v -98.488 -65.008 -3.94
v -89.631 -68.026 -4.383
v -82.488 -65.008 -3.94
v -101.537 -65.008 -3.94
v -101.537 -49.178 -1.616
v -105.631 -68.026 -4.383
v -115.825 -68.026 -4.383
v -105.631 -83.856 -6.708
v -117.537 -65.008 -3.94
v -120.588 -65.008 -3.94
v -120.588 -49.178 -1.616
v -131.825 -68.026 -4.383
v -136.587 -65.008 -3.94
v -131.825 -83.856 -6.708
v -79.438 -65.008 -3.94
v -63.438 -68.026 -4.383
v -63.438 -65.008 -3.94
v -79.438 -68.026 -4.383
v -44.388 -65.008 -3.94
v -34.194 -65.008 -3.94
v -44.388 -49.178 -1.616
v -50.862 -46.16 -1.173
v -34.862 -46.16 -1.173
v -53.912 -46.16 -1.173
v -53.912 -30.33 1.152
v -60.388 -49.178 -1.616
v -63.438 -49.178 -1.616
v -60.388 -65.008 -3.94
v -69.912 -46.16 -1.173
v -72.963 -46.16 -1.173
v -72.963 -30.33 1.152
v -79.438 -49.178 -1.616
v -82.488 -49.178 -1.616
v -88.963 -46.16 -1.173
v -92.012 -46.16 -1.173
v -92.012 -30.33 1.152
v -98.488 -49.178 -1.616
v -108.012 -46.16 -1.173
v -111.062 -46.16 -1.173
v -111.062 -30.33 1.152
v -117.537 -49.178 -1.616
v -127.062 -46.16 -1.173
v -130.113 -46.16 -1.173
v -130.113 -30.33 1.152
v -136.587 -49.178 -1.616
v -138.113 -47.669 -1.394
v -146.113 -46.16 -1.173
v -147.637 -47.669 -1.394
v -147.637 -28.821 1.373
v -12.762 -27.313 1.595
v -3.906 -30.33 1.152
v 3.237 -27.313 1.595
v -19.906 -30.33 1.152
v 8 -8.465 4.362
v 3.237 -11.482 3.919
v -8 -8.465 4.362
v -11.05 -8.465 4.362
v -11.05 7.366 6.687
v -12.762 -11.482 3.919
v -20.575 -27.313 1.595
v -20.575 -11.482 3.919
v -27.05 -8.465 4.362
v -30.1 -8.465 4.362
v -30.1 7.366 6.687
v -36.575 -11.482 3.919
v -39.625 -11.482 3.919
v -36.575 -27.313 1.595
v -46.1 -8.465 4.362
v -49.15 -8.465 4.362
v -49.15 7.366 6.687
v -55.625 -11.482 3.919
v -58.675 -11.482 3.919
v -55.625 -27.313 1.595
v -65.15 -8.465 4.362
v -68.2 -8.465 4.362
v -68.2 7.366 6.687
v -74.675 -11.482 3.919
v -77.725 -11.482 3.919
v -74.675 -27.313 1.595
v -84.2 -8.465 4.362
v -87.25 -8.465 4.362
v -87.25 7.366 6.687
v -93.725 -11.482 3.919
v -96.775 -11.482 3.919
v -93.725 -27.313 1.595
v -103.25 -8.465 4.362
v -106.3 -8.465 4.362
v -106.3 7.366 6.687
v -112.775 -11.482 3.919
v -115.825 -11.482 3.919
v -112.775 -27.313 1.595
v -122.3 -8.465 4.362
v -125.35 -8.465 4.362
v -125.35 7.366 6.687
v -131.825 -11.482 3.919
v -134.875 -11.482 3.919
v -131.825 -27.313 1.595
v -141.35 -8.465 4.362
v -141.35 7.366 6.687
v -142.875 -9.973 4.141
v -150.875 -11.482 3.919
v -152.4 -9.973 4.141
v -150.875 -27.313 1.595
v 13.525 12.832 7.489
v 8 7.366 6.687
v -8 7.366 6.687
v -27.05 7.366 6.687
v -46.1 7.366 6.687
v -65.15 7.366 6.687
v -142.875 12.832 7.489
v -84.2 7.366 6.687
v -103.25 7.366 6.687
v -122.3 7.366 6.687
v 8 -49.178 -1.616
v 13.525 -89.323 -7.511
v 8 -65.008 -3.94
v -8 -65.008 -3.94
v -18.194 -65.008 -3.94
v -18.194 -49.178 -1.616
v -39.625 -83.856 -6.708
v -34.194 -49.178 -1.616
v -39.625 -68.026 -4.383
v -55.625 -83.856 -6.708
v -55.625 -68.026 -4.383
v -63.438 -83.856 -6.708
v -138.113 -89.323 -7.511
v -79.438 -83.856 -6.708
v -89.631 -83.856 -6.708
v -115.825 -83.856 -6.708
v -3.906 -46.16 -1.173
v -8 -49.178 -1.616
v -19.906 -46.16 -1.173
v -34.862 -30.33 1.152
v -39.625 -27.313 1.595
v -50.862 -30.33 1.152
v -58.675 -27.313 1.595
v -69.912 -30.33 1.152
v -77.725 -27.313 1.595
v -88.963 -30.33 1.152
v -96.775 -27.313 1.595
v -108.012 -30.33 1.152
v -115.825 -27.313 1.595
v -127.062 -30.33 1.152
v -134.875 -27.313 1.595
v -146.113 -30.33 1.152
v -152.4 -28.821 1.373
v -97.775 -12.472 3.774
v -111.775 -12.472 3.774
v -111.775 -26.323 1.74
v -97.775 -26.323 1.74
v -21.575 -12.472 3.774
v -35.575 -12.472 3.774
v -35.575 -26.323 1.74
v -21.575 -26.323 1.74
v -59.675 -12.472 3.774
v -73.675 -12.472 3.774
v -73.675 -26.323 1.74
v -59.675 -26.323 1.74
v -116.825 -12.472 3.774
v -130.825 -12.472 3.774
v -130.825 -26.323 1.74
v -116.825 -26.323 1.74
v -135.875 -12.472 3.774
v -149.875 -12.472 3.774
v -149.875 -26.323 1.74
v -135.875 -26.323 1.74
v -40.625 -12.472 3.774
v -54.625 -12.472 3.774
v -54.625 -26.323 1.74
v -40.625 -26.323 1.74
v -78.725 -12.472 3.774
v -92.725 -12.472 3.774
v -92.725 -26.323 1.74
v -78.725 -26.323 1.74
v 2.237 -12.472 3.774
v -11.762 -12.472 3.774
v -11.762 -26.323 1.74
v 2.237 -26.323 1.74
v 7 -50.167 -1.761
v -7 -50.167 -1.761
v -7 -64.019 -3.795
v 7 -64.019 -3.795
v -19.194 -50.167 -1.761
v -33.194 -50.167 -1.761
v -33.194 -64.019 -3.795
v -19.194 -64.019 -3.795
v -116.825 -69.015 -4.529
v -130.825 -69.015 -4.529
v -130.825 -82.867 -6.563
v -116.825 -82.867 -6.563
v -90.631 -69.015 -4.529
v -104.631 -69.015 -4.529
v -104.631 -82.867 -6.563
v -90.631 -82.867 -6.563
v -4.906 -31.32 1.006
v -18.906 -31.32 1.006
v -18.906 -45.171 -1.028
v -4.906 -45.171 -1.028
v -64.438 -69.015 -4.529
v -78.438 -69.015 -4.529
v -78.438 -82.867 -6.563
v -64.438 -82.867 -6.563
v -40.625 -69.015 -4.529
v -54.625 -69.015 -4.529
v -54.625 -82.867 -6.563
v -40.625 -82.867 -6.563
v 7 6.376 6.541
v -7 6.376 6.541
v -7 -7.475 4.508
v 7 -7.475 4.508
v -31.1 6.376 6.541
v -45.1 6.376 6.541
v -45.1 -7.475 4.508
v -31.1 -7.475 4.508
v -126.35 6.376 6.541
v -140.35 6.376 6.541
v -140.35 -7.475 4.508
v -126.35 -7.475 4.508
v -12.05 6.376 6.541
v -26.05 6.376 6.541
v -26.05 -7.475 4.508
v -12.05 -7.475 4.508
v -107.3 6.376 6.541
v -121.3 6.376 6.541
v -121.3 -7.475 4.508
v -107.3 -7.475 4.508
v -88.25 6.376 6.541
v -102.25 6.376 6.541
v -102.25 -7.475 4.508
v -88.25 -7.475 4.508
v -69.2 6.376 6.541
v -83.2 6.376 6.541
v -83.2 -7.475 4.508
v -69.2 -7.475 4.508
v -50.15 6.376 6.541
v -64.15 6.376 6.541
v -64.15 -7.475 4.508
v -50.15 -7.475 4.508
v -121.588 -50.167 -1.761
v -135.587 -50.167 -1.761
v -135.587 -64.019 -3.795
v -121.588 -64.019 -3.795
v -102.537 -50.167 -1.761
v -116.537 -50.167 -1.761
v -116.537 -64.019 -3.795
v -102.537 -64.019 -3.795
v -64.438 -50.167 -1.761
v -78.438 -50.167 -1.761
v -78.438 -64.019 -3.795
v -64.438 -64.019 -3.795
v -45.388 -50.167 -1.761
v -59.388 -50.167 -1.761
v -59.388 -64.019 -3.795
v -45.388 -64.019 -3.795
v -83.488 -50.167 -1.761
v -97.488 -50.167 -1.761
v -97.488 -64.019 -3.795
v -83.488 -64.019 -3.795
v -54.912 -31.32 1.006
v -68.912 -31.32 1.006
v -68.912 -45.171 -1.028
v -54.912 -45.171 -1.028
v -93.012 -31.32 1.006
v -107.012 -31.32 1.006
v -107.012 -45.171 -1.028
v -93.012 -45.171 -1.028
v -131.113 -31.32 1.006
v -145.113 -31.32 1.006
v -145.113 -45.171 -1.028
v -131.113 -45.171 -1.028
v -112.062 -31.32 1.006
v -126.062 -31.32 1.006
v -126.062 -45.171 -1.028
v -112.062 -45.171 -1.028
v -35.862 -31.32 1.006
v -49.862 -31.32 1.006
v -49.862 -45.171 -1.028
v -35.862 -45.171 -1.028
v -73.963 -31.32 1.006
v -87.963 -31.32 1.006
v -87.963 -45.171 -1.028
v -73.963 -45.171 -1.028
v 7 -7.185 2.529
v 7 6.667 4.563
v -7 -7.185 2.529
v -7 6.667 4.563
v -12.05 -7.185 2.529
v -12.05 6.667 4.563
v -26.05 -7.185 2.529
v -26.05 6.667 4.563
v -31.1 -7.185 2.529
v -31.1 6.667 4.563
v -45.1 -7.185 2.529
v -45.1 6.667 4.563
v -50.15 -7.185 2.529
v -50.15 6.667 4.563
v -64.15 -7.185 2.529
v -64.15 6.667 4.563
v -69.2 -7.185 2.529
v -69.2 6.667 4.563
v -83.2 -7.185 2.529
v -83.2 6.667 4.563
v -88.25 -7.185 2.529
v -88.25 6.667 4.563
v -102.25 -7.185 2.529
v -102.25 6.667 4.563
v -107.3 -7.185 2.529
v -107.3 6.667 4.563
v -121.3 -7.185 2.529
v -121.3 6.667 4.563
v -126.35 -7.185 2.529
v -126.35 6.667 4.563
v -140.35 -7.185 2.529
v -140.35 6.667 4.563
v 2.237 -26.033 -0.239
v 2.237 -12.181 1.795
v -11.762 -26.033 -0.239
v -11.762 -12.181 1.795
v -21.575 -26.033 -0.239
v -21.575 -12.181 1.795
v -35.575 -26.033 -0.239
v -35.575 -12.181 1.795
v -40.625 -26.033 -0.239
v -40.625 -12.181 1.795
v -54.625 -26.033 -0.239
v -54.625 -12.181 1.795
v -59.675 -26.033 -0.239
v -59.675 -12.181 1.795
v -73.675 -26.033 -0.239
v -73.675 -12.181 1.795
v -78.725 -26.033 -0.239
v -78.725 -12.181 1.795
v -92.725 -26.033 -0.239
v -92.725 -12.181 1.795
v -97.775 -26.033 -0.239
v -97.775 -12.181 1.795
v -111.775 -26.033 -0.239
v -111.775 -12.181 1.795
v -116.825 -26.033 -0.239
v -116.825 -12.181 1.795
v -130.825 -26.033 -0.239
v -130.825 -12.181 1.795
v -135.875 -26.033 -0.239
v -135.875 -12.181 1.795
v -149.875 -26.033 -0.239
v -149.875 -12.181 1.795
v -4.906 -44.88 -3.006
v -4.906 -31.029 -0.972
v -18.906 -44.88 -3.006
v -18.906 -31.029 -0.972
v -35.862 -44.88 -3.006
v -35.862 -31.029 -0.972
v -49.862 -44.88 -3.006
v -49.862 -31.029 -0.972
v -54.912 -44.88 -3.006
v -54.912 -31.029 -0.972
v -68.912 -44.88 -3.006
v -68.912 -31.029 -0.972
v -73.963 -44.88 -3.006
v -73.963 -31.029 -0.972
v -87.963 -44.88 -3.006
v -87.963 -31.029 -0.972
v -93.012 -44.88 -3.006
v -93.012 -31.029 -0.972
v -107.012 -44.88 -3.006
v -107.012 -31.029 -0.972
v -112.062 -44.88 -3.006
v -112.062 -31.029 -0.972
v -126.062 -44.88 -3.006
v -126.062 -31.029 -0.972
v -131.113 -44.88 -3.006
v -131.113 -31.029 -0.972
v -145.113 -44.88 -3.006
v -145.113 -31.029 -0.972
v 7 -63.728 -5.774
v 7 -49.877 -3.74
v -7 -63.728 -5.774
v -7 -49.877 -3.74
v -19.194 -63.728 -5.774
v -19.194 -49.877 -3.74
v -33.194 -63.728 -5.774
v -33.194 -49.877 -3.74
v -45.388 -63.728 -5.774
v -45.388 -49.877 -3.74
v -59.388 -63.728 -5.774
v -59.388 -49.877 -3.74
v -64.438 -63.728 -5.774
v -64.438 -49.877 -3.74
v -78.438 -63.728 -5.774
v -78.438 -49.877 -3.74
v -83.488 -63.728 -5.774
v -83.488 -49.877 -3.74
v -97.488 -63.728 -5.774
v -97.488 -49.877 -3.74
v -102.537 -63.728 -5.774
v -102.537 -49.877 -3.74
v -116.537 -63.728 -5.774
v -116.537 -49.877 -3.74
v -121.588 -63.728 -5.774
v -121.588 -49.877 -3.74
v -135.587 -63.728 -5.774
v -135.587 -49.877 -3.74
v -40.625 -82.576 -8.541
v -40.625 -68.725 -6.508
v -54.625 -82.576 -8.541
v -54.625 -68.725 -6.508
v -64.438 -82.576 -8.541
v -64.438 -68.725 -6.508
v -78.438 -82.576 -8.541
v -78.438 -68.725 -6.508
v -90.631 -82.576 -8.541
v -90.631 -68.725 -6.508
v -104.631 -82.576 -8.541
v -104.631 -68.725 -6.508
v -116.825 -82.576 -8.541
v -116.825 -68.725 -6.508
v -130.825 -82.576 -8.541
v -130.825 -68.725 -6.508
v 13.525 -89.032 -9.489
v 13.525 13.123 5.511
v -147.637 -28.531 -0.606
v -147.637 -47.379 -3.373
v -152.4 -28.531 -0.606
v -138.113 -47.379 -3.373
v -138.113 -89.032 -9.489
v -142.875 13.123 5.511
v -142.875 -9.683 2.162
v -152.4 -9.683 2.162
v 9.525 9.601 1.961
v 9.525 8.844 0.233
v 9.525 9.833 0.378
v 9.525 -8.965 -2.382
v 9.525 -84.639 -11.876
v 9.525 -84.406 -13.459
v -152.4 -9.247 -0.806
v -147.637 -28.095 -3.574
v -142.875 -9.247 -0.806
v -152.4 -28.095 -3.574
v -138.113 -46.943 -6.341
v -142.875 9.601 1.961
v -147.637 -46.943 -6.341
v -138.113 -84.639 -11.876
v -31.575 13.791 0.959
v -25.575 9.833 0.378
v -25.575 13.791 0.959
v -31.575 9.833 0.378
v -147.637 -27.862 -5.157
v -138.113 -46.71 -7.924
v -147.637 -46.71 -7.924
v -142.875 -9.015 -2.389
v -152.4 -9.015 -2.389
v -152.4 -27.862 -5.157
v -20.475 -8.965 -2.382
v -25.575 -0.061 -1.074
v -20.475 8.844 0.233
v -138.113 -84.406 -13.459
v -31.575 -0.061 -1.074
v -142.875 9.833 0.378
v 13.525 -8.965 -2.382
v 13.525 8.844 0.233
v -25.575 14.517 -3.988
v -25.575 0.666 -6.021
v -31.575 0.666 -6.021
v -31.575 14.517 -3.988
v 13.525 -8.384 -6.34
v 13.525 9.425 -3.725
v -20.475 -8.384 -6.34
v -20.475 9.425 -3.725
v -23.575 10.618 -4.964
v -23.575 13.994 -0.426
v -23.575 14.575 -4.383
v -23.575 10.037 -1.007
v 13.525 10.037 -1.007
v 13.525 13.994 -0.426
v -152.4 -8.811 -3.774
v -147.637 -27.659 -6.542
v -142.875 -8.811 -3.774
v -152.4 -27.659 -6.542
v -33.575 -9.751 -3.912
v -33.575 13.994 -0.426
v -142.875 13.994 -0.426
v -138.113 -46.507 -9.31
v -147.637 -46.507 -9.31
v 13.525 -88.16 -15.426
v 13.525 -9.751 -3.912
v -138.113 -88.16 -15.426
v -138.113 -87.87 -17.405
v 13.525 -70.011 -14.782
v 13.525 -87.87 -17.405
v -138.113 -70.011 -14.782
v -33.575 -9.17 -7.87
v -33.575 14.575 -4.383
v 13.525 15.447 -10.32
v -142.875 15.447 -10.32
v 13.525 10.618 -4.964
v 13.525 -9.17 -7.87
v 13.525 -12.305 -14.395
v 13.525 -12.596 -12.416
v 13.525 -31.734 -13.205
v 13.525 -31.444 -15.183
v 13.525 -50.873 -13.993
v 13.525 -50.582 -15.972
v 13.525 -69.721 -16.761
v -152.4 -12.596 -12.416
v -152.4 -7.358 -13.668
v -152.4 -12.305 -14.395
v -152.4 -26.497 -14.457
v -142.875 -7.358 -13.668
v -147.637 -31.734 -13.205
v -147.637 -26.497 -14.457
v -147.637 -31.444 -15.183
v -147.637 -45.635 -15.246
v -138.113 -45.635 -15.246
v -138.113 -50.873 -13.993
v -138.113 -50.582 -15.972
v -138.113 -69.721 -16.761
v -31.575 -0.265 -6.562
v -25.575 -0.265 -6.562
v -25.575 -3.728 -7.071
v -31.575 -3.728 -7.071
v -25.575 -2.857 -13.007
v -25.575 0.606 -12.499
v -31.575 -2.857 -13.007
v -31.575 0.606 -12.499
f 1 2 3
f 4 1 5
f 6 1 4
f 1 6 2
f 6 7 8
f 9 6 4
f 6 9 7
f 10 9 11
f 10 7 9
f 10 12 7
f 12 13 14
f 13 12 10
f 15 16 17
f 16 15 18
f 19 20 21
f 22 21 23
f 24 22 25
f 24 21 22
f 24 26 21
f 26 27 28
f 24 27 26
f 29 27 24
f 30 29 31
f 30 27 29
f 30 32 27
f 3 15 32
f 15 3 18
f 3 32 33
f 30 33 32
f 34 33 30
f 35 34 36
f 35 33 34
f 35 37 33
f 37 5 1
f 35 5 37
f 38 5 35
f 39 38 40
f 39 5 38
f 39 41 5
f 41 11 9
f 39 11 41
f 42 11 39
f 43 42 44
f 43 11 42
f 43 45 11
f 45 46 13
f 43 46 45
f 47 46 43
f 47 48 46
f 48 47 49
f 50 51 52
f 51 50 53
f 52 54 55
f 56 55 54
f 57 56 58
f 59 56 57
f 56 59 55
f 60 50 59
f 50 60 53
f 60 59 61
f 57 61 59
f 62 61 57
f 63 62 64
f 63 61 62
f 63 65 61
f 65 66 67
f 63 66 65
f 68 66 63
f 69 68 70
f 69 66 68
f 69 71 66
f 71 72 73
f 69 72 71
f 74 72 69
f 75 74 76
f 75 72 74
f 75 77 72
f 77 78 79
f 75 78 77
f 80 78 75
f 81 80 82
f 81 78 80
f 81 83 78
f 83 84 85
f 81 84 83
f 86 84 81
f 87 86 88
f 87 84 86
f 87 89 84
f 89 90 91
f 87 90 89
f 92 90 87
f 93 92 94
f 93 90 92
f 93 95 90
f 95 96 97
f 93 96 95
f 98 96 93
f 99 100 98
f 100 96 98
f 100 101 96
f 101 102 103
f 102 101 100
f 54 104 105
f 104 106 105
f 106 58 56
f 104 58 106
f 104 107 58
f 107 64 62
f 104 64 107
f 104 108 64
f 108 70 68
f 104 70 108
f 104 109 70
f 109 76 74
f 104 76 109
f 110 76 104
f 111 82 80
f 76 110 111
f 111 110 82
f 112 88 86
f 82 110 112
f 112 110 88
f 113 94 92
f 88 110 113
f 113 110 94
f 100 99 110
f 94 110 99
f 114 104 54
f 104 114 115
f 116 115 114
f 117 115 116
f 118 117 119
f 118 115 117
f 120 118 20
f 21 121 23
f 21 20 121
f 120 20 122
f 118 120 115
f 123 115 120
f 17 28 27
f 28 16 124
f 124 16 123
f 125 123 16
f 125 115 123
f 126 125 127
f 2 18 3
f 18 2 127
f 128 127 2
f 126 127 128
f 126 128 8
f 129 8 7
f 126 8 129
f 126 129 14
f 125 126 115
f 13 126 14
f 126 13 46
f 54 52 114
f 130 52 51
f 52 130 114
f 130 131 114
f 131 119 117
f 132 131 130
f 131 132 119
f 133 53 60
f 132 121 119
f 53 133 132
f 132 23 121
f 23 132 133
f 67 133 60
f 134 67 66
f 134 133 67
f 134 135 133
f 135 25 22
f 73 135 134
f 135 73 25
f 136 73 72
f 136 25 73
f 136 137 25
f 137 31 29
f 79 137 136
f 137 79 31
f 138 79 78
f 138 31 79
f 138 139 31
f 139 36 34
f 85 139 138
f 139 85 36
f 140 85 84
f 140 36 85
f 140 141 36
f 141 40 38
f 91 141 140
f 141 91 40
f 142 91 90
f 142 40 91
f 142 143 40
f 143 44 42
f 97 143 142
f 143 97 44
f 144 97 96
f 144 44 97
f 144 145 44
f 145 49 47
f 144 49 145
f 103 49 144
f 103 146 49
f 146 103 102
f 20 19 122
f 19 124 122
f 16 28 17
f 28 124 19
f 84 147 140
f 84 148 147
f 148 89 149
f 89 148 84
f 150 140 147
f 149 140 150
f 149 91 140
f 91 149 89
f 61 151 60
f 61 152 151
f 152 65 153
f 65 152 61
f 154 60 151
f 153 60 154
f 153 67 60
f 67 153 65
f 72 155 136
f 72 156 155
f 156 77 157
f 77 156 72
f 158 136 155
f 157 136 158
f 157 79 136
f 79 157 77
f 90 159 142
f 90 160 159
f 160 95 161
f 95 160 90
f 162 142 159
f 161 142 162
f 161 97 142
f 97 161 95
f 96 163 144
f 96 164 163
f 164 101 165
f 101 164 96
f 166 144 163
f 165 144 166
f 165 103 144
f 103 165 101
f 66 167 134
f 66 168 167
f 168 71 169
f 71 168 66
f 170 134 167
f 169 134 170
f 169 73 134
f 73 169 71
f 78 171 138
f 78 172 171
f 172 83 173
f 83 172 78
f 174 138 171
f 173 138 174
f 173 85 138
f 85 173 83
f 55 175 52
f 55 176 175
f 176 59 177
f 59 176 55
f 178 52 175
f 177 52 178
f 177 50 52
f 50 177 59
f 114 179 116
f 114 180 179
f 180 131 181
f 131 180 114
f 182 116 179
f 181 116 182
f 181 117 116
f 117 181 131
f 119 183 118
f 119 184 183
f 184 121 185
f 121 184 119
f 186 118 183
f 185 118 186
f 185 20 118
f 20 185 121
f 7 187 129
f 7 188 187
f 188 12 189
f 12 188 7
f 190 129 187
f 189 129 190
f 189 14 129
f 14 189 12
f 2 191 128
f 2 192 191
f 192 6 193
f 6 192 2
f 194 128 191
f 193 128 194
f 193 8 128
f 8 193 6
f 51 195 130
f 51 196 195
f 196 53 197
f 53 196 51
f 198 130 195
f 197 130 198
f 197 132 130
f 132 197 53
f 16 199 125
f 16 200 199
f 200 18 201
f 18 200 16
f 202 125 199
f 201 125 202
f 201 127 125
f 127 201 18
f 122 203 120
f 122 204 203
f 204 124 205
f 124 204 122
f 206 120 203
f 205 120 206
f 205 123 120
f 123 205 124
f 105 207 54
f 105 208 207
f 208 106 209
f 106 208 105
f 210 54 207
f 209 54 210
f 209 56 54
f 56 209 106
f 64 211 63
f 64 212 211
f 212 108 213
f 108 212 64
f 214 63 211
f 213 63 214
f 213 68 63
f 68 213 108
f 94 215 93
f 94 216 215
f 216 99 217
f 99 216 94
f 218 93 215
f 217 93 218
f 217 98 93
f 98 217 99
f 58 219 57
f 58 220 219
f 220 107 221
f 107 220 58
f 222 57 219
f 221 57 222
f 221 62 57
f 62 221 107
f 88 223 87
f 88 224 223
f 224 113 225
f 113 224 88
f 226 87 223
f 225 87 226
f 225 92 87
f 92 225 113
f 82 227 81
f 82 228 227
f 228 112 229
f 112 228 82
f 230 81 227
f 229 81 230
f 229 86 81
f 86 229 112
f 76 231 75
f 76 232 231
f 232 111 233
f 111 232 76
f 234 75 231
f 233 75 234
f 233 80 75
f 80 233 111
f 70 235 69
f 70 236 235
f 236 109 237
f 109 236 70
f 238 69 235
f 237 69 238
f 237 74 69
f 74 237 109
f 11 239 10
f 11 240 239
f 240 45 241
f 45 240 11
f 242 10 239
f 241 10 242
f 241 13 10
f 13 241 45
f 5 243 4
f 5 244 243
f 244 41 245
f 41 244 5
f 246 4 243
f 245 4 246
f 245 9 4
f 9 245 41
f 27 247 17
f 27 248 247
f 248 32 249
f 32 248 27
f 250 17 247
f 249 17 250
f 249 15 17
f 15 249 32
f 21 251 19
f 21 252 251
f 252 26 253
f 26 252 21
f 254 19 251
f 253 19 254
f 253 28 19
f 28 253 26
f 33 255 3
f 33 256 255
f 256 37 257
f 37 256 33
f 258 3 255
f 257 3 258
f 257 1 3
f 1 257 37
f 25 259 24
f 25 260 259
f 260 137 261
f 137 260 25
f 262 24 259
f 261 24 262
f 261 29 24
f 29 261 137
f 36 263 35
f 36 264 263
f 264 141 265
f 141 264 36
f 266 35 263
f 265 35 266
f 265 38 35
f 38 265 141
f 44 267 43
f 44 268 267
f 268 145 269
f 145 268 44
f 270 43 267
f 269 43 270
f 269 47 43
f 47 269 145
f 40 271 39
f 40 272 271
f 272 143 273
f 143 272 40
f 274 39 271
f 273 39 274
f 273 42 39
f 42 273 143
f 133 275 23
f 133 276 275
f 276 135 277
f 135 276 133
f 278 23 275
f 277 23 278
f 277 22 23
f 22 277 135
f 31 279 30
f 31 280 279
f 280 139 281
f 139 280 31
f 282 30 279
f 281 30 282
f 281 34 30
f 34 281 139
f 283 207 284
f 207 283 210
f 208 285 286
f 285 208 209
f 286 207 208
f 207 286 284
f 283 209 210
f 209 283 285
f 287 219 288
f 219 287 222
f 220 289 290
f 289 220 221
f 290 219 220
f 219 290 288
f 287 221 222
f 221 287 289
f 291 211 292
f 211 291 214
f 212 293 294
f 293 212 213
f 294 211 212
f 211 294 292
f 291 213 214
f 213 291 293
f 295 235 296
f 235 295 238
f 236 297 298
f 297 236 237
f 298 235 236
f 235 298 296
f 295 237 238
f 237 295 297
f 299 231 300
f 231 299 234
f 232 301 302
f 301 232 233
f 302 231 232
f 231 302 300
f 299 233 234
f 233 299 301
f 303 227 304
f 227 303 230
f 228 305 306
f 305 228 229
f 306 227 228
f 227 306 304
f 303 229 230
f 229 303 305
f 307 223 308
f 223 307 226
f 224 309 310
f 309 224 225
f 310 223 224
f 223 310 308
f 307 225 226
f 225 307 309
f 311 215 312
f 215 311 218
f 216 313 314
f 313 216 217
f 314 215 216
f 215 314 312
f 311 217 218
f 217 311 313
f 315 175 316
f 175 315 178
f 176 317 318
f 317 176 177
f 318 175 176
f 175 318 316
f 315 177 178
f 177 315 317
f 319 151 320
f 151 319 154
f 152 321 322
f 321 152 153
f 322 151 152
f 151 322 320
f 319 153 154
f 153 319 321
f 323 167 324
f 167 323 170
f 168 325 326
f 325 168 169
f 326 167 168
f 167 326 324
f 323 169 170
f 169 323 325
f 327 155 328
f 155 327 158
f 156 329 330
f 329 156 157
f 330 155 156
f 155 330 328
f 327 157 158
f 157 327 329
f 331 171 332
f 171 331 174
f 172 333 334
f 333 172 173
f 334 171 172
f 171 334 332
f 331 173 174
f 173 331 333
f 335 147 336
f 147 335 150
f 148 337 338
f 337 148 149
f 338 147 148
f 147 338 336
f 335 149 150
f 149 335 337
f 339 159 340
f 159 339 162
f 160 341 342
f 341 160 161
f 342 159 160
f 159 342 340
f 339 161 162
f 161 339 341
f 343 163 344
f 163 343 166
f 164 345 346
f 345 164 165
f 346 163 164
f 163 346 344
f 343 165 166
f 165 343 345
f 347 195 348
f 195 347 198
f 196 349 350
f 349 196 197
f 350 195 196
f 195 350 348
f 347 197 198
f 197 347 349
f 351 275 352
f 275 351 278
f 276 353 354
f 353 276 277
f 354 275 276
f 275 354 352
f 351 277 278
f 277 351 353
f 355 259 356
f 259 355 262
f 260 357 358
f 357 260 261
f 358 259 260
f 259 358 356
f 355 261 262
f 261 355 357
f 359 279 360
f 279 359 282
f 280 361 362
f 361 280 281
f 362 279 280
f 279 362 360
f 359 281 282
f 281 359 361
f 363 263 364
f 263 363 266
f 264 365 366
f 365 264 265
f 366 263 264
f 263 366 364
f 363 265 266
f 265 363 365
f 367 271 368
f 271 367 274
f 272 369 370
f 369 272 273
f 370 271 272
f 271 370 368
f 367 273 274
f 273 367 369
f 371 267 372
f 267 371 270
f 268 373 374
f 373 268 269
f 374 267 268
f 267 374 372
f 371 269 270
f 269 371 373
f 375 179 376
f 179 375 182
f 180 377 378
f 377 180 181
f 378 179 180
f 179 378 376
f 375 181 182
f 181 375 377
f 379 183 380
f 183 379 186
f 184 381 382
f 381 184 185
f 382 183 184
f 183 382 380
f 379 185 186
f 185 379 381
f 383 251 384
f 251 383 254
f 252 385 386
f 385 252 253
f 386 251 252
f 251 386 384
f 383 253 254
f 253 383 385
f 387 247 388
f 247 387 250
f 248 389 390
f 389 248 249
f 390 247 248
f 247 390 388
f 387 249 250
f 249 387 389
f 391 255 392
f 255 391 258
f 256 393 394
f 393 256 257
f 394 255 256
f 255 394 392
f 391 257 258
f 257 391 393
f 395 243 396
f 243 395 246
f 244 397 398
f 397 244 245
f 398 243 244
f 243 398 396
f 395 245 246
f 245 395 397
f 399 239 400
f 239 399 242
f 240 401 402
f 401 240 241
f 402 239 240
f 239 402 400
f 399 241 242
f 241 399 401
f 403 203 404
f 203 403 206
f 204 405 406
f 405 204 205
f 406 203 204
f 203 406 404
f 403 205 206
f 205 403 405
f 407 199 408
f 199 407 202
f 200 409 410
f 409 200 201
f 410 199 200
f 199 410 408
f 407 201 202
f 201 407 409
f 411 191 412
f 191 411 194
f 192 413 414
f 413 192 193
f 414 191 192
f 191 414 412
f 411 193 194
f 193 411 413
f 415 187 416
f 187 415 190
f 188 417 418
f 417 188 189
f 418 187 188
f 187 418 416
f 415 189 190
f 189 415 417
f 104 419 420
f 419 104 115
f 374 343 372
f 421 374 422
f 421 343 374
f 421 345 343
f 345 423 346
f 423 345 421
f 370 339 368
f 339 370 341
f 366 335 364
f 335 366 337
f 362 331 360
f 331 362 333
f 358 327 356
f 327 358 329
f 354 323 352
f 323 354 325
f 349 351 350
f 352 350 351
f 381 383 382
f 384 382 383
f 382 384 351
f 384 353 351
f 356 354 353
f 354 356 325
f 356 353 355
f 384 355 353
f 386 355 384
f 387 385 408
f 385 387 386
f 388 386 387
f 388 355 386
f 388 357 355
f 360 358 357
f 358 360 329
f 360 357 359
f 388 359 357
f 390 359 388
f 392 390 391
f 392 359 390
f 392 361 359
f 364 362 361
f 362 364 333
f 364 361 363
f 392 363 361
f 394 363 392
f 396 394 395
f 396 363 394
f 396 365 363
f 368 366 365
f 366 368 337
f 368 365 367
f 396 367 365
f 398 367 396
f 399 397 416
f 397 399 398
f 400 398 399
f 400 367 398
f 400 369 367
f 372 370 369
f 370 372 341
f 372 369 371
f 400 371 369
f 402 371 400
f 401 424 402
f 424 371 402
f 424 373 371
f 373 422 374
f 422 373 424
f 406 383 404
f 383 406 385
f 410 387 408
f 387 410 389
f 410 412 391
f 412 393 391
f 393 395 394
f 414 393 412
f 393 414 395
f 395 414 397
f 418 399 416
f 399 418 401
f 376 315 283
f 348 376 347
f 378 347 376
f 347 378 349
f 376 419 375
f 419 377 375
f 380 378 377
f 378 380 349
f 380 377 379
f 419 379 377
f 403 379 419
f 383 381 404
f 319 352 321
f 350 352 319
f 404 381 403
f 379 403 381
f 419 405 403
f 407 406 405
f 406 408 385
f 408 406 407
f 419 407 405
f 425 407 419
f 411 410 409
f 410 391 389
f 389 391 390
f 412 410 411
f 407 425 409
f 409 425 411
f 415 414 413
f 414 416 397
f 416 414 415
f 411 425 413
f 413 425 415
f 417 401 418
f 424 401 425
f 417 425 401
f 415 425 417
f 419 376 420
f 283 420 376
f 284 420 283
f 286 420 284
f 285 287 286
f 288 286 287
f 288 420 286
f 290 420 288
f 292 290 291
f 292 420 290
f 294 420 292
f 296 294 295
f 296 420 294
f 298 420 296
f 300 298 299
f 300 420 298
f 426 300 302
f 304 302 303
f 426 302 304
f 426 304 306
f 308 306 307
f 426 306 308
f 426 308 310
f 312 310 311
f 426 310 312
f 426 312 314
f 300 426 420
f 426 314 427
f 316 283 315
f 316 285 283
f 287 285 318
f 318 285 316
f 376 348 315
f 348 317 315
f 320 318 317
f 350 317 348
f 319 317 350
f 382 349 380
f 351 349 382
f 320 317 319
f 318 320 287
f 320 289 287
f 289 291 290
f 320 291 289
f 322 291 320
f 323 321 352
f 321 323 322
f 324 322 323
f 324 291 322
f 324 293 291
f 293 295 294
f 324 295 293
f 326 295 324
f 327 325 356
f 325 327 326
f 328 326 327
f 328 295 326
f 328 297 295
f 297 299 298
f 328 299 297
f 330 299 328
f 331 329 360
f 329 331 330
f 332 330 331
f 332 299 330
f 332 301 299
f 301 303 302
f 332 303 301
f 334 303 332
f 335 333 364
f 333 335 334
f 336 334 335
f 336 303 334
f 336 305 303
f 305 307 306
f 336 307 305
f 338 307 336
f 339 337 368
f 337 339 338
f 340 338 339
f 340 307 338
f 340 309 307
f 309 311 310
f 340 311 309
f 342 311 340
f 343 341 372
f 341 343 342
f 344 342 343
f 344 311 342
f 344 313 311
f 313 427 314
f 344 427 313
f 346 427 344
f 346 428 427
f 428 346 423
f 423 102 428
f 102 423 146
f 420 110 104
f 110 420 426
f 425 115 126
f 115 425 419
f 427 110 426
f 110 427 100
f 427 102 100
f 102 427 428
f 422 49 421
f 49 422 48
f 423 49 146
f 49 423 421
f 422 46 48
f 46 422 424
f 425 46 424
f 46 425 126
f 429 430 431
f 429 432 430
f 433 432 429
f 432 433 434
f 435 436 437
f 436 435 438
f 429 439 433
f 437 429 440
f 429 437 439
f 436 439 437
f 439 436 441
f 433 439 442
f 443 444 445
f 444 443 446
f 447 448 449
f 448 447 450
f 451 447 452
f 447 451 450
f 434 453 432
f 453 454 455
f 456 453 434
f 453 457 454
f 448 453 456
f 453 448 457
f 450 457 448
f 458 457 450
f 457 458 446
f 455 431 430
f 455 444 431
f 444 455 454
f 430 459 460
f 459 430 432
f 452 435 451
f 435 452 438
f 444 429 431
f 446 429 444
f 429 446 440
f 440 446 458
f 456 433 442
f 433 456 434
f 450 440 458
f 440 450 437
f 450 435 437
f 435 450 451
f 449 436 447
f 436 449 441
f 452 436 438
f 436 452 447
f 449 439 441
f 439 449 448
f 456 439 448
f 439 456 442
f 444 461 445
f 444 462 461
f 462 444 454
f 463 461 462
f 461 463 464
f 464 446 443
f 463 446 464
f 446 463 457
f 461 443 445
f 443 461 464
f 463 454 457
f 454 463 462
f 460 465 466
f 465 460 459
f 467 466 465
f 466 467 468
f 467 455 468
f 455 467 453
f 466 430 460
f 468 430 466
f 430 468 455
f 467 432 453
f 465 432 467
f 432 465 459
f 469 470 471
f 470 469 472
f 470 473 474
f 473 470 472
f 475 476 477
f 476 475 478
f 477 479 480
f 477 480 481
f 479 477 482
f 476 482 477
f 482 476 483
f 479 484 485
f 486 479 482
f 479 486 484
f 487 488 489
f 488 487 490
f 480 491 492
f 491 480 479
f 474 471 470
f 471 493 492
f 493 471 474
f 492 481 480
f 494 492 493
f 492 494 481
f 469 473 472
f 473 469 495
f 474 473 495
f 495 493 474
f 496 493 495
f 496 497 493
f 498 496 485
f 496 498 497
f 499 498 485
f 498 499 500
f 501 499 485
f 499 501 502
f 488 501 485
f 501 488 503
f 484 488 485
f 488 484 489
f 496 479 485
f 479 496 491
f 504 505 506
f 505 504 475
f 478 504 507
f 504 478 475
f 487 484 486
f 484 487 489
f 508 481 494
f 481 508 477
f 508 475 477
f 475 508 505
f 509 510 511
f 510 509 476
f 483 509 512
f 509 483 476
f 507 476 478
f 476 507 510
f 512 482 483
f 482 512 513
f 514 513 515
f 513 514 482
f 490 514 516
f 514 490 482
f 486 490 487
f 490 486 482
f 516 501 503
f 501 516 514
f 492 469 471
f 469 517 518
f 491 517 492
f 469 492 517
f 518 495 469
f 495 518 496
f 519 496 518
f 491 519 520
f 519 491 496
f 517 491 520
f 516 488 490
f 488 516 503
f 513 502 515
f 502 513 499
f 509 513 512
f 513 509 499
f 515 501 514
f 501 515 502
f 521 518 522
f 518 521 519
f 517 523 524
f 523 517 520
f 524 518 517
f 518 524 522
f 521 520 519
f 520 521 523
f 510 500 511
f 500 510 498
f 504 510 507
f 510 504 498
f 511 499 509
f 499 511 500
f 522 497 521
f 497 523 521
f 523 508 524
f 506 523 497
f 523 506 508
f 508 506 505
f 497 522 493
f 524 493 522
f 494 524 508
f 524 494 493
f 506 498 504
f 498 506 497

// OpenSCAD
// file: key_switch.scad
key_switch(0, 0);

// key_hole(0, 0);

module key_switch(x, y) {
    union() {
        h1 = 2;
        translate([x, y, h1 / 2]) {
            cube([16, 16, h1], center=true);
        }
        h2 = 5;
        translate([x, y, h1 + h2 / 2]) {
            cube([16, 16, h2], center=true);
        }
        h3 = 1.2;
        translate([x, y, -h3 / 2]) {
            cube([14, 14, h3], center=true);
        }
        h4 = 1.5;
        translate([x, y, -h3 - h4 / 2]) {
            cube([14, 16, h4], center=true);
        }
        h5 = 10;
        translate([x, y, -h3 - h4 - h5 / 2]) {
            cube([14, 14, h5], center=true);
        }
        key_cap(x, y);
    }
}

module key_cap(x, y) {
    wx1 = 18;
    dx1 = wx1 / 2;

    wy1 = 18;
    dy1 = wy1 / 2;

    wx2 = 12;
    dx2 = wx2 / 2;

    wy2 = 13;
    ry2 = 0.6; // should be greater than 0.5

    z1 = 7;

    z2 = z1 + 10;

    points = [
    [x + dx1, y + dy1, z1], // 0
    [x + dx1, y - dy1, z1], // 1
    [x - dx1, y + dy1, z1], // 2
    [x - dx1, y - dy1, z1], // 3
    [x + dx2, y + ry2 * wy2, z2], // 4
    [x + dx2, y - (1 - ry2) * wy2, z2], // 5
    [x - dx2, y + ry2 * wy2, z2], // 6
    [x - dx2, y - (1 - ry2) * wy2, z2] // 7
    ];
    
    // "All faces must have points ordered in the same direction . OpenSCAD prefers clockwise when looking at each face from outside inwards (from OpenSCAD User Manual/Primitive Solids)"
    faces = [
        [0, 2, 3, 1], // bottom
        [0, 1, 5, 4], // right
        [1, 3, 7, 5], // front
        [3, 2, 6, 7], // left
        [2, 0, 4, 6], // back
        [4, 5, 7, 6]  // top
    ];
    
    polyhedron(points, faces);
}

module key_hole(x, y) {
    union() {
        h1 = 2;
        translate([x, y, h1 / 2]) {
            cube([16, 16, h1], center=true);
        }
        h2 = 5;
        translate([x, y, h1 + h2 / 2]) {
            cube([16, 16, h2], center=true);
        }
        h3 = 1.2;
        translate([x, y, -h3 / 2]) {
            cube([14, 14, h3], center=true);
        }
        h4 = 1.5;
        translate([x, y, -h3 - h4 / 2]) {
            cube([14, 14, h4], center=true);
        }
        h5 = 10;
        translate([x, y, -h3 - h4 - h5 / 2]) {
            cube([14, 14, h5], center=true);
        }
    }
}
// main file
use <key_switch.scad>

only_plate = false;
no_pcb = false;

w_unit = 19.05; // unit width

y1 = 0;           // row1
y2 = -w_unit;     // row2
y3 = -2 * w_unit; // row3
y4 = -3 * w_unit; // row4
y5 = -4 * w_unit; // row5hole

plate_padding_x_l = 0; // plate padding x left 
plate_padding_x_r = 4; // plate padding x right
plate_padding_y_t = 4; // plate padding y top
plate_padding_y_b = 4; // plate padding y bottom

plate_w_x_no_padding = w_unit / 2 + 8 * w_unit;
plate_w_y_no_padding = w_unit / 2 + 4.5 * w_unit;

plate_w_x = plate_padding_x_l + plate_w_x_no_padding + plate_padding_x_r;
plate_w_y = plate_padding_y_t + plate_w_y_no_padding + plate_padding_y_b;

plate_h = 2;

pro_micro_w_x = 34;
pro_micro_w_y = 18;
pro_micro_h = 4;
pro_micro_hole_w_y = 20;
trrs_hole_w_x = 10;
trrs_hole_x = -plate_padding_x_r - 2 * w_unit + trrs_hole_w_x / 2;
trrs_w_x = 6;
trrs_w_y = 14;
trrs_h = 5;
reset_hole_y = trrs_w_y + 1;
reset_hole_w_x = 6;
reset_hole_w_y = 3.5;

pcb_h = 1.6;

keyboard_h_low = 10;
keyboard_h_high = 25;
plate_rotation_x = asin((keyboard_h_high - keyboard_h_low) / plate_w_y);

right_keyboard();

module right_keyboard() {
    untranslate_plate_origin_in_yz_plane() {
        rotate([plate_rotation_x, 0, 0]) {
            translate_plate_origin_in_yz_plane() {
                union() {
                    right_top_plate();
                    if (!only_plate) {
                        translate([0, 0, -5]) {
                            right_pcb();
                        }
                    }
                    translate([0, 0, -plate_h - 6]) {
                        right_bottom_plate_1();
                    }
                    translate([0, 0, -2 * plate_h - 6]) {
                        right_bottom_plate_2();
                    }
                    translate([0, 0, -3 * plate_h - 6]) {
                        right_bottom_plate_3();
                    }
                    translate([0, 0, -4 * plate_h - 6]) {
                        right_bottom_plate_4();
                    }
                    translate([0, 0, -5 * plate_h - 6]) {
                        right_bottom_plate_5();
                    }
                }
            }
        }
    }
}

module right_top_plate() {
    difference() {    
        right_plate();
        key_holes();
        unit_cube(-8 * w_unit - plate_padding_x_l, y1 + w_unit);
        unit_cube(-8 * w_unit - plate_padding_x_l, y1);
        unit_cube(-(2.25 + 6) * w_unit - plate_padding_x_l, y3);
        unit_cube(-(2.75 + 5) * w_unit - plate_padding_x_l, y4);
        unit_cube(-(2.75 + 5) * w_unit - plate_padding_x_l, y5);
        unit_cube(-(2.75 + 5) * w_unit - plate_padding_x_l, y5 - w_unit);
    }
}

module right_bottom_plate_1() {
    difference() {
        translate([-plate_w_x + w_unit / 2 + plate_padding_x_r, -plate_w_y + plate_padding_y_t + w_unit / 2, -plate_h]) {
            cube([plate_w_x, plate_w_y, plate_h], center = false);
        }
        right_pro_micro_space();
        right_reset_hole();
        unit_cube(-8 * w_unit - plate_padding_x_l, y1 + w_unit);
        unit_cube(-8 * w_unit - plate_padding_x_l, y1);
        unit_cube(-(2.25 + 6) * w_unit - plate_padding_x_l, y3);
        unit_cube(-(2.75 + 5) * w_unit - plate_padding_x_l, y4);
        unit_cube(-(2.75 + 5) * w_unit - plate_padding_x_l, y5);
        unit_cube(-(2.75 + 5) * w_unit - plate_padding_x_l, y5 - w_unit);
    }
}

module right_bottom_plate_2() {
    offset = w_unit - 1;
    difference() {
        translate([-plate_w_x + w_unit / 2 + plate_padding_x_r, -plate_w_y + plate_padding_y_t + w_unit / 2 + offset, -plate_h]) {
            cube([plate_w_x, plate_w_y - offset, plate_h], center = false);
        }
        right_pro_micro_space();
        right_reset_hole();
        unit_cube(-8 * w_unit - plate_padding_x_l, y1 + w_unit);
        unit_cube(-8 * w_unit - plate_padding_x_l, y1);
        unit_cube(-(2.25 + 6) * w_unit - plate_padding_x_l, y3);
        unit_cube(-(2.75 + 5) * w_unit - plate_padding_x_l, y4);
        unit_cube(-(2.75 + 5) * w_unit - plate_padding_x_l, y5);
        unit_cube(-(2.75 + 5) * w_unit - plate_padding_x_l, y5 - w_unit);
    }
}

module right_bottom_plate_3() {
    offset = 2 * w_unit - 1;
    difference() {
        translate([-plate_w_x + w_unit / 2 + plate_padding_x_r, -plate_w_y + plate_padding_y_t + w_unit / 2 + offset, -plate_h]) {
            cube([plate_w_x, plate_w_y - offset, plate_h], center = false);
        }
        right_reset_hole();
        unit_cube(-8 * w_unit - plate_padding_x_l, y1 + w_unit);
        unit_cube(-8 * w_unit - plate_padding_x_l, y1);
        unit_cube(-(2.25 + 6) * w_unit - plate_padding_x_l, y3);
        unit_cube(-(2.75 + 5) * w_unit - plate_padding_x_l, y4);
        unit_cube(-(2.75 + 5) * w_unit - plate_padding_x_l, y5);
        unit_cube(-(2.75 + 5) * w_unit - plate_padding_x_l, y5 - w_unit);
    }
}

module right_bottom_plate_4() {
    offset = 3 * w_unit - 1;
    difference() {
        translate([-plate_w_x + w_unit / 2 + plate_padding_x_r, -plate_w_y + plate_padding_y_t + w_unit / 2 + offset, -plate_h]) {
            cube([plate_w_x, plate_w_y - offset, plate_h], center = false);
        }
        right_reset_hole();
        unit_cube(-8 * w_unit - plate_padding_x_l, y1 + w_unit);
        unit_cube(-8 * w_unit - plate_padding_x_l, y1);
        unit_cube(-(2.25 + 6) * w_unit - plate_padding_x_l, y3);
        unit_cube(-(2.75 + 5) * w_unit - plate_padding_x_l, y4);
        unit_cube(-(2.75 + 5) * w_unit - plate_padding_x_l, y5);
        unit_cube(-(2.75 + 5) * w_unit - plate_padding_x_l, y5 - w_unit);
    }
}

module right_bottom_plate_5() {
    offset = 4 * w_unit - 1;
    difference() {
        translate([-plate_w_x + w_unit / 2 + plate_padding_x_r, -plate_w_y + plate_padding_y_t + w_unit / 2 + offset, -plate_h]) {
            cube([plate_w_x, plate_w_y - offset, plate_h], center = false);
        }
        right_reset_hole();
        unit_cube(-8 * w_unit - plate_padding_x_l, y1 + w_unit);
        unit_cube(-8 * w_unit - plate_padding_x_l, y1);
        unit_cube(-(2.25 + 6) * w_unit - plate_padding_x_l, y3);
        unit_cube(-(2.75 + 5) * w_unit - plate_padding_x_l, y4);
        unit_cube(-(2.75 + 5) * w_unit - plate_padding_x_l, y5);
        unit_cube(-(2.75 + 5) * w_unit - plate_padding_x_l, y5 - w_unit);
    }
}

module right_pcb() {
    union() {
        if (!no_pcb) {
            difference() {
                translate([plate_padding_x_l - plate_w_x + w_unit / 2 + plate_padding_x_r, plate_padding_y_b - plate_w_y + plate_padding_y_t + w_unit / 2, -pcb_h]) {
                    cube([plate_w_x_no_padding, plate_w_y_no_padding, pcb_h], center = false);
                }
                unit_cube(-8 * w_unit - plate_padding_x_l, y1 + w_unit);
                unit_cube(-8 * w_unit - plate_padding_x_l, y1);
                unit_cube(-(2.25 + 6) * w_unit - plate_padding_x_l, y3);
                unit_cube(-(2.75 + 5) * w_unit - plate_padding_x_l, y4);
                unit_cube(-(2.75 + 5) * w_unit - plate_padding_x_l, y5);
                unit_cube(-(2.75 + 5) * w_unit - plate_padding_x_l, y5 - w_unit);
            }
        }
        translate([0, 0, -pcb_h]) {
            right_trrs();
        }
        translate([0, 0, -pcb_h]) {
            right_pro_micro();
        }
    }
}

module right_trrs() {
    translate([trrs_hole_x - trrs_w_x - trrs_hole_w_x / 2 + trrs_w_x / 2, -trrs_w_y, -trrs_h]) {
        translate_from_origin_to_plate_right_top() {
            cube([trrs_w_x, trrs_w_y, trrs_h], center = false);
        }
    }
}

module right_pro_micro() {
    translate([-pro_micro_w_x, -plate_padding_y_t - pro_micro_hole_w_y / 2 - pro_micro_w_y / 2, -pro_micro_h]) {
        translate_from_origin_to_plate_right_top() {
            cube([pro_micro_w_x, pro_micro_w_y, pro_micro_h], center = false);
        }
    }
}

module right_pro_micro_space() {
    union() {
        translate([trrs_hole_x - trrs_hole_w_x, -plate_padding_y_t, -plate_h]) {
            translate_from_origin_to_plate_right_top() {
                cube([trrs_hole_w_x, plate_padding_y_t, plate_h], center = false);
            }
        }
        translate([trrs_hole_x - trrs_hole_w_x, -pro_micro_hole_w_y - plate_padding_y_t, -plate_h]) {
            translate_from_origin_to_plate_right_top() {
                cube([-trrs_hole_x + trrs_hole_w_x, pro_micro_hole_w_y, plate_h], center = false);
            }
        }
    }
}

module right_reset_hole() {
    union() {
        translate([trrs_hole_x - reset_hole_w_x - trrs_hole_w_x / 2 + reset_hole_w_x / 2, -reset_hole_w_y - reset_hole_y, -plate_h]) {
            translate_from_origin_to_plate_right_top() {
                cube([reset_hole_w_x, reset_hole_w_y, plate_h], center = false);
            }
        }
    }
}

module right_plate() {
    translate([-plate_w_x + w_unit / 2 + plate_padding_x_r, -plate_w_y + plate_padding_y_t + w_unit / 2, -plate_h]) {
        cube([plate_w_x, plate_w_y, plate_h], center = false);
    }
}

module key_holes() {
    // row 1
    y1 = 0;
    for (i = [0:7]) {
        key_hole(-i * w_unit, y1);
    }

    // row 2
    y2 = -w_unit;
    key_hole(-0.25 * w_unit, y2);
    for (i = [0:6]) {
        key_hole(-(1.5 + i) * w_unit, y2);
    }

    // row 3
    y3 = -2 * w_unit;
    key_hole(-0.625 * w_unit, y3);
    for (i = [0:5]) {
        key_hole(-(2.25 + i) * w_unit, y3);
    }

    // row 4
    y4 = -3 * w_unit;
    key_hole(0, y4);
    key_hole(-1.375 * w_unit, y4);
    for (i = [0:4]) {
        key_hole(-(2.75 + i) * w_unit, y4);
    }
    
    // row 5
    y5 = -4 * w_unit;
    key_hole(-2.5 * w_unit, y5);
    key_hole(-3.75 * w_unit, y5);
    key_hole(-5.125 * w_unit, y5);
    key_hole(-6.5 * w_unit, y5);
}

module unit_cube(x, y) {
    translate([x, y, 0]) {
        cube([w_unit, w_unit, w_unit], center = true);
    }
}

// operator modules

module translate_plate_origin_in_yz_plane() {
    translate([0, plate_w_y / 2, plate_h / 2]) {
        translate([0, -w_unit / 2 - plate_padding_y_t, 0]) {
            children();
        }
    }
}

module untranslate_plate_origin_in_yz_plane() {
    translate([0, w_unit / 2 + plate_padding_y_t, 0]) {
        translate([0, -plate_w_y / 2, -plate_h / 2]) {
            children();
        }
    }
}

module translate_from_origin_to_plate_right_bottom() {
    translate_from_origin_to_plate_right_top() {
        translate([0, -plate_w_y, 0]) {
            children();
        }
    }
}

module translate_from_origin_to_plate_right_top() {
    translate([w_unit / 2 + plate_padding_x_r, w_unit / 2 + plate_padding_y_t, 0]) {
        children();
    }
}
